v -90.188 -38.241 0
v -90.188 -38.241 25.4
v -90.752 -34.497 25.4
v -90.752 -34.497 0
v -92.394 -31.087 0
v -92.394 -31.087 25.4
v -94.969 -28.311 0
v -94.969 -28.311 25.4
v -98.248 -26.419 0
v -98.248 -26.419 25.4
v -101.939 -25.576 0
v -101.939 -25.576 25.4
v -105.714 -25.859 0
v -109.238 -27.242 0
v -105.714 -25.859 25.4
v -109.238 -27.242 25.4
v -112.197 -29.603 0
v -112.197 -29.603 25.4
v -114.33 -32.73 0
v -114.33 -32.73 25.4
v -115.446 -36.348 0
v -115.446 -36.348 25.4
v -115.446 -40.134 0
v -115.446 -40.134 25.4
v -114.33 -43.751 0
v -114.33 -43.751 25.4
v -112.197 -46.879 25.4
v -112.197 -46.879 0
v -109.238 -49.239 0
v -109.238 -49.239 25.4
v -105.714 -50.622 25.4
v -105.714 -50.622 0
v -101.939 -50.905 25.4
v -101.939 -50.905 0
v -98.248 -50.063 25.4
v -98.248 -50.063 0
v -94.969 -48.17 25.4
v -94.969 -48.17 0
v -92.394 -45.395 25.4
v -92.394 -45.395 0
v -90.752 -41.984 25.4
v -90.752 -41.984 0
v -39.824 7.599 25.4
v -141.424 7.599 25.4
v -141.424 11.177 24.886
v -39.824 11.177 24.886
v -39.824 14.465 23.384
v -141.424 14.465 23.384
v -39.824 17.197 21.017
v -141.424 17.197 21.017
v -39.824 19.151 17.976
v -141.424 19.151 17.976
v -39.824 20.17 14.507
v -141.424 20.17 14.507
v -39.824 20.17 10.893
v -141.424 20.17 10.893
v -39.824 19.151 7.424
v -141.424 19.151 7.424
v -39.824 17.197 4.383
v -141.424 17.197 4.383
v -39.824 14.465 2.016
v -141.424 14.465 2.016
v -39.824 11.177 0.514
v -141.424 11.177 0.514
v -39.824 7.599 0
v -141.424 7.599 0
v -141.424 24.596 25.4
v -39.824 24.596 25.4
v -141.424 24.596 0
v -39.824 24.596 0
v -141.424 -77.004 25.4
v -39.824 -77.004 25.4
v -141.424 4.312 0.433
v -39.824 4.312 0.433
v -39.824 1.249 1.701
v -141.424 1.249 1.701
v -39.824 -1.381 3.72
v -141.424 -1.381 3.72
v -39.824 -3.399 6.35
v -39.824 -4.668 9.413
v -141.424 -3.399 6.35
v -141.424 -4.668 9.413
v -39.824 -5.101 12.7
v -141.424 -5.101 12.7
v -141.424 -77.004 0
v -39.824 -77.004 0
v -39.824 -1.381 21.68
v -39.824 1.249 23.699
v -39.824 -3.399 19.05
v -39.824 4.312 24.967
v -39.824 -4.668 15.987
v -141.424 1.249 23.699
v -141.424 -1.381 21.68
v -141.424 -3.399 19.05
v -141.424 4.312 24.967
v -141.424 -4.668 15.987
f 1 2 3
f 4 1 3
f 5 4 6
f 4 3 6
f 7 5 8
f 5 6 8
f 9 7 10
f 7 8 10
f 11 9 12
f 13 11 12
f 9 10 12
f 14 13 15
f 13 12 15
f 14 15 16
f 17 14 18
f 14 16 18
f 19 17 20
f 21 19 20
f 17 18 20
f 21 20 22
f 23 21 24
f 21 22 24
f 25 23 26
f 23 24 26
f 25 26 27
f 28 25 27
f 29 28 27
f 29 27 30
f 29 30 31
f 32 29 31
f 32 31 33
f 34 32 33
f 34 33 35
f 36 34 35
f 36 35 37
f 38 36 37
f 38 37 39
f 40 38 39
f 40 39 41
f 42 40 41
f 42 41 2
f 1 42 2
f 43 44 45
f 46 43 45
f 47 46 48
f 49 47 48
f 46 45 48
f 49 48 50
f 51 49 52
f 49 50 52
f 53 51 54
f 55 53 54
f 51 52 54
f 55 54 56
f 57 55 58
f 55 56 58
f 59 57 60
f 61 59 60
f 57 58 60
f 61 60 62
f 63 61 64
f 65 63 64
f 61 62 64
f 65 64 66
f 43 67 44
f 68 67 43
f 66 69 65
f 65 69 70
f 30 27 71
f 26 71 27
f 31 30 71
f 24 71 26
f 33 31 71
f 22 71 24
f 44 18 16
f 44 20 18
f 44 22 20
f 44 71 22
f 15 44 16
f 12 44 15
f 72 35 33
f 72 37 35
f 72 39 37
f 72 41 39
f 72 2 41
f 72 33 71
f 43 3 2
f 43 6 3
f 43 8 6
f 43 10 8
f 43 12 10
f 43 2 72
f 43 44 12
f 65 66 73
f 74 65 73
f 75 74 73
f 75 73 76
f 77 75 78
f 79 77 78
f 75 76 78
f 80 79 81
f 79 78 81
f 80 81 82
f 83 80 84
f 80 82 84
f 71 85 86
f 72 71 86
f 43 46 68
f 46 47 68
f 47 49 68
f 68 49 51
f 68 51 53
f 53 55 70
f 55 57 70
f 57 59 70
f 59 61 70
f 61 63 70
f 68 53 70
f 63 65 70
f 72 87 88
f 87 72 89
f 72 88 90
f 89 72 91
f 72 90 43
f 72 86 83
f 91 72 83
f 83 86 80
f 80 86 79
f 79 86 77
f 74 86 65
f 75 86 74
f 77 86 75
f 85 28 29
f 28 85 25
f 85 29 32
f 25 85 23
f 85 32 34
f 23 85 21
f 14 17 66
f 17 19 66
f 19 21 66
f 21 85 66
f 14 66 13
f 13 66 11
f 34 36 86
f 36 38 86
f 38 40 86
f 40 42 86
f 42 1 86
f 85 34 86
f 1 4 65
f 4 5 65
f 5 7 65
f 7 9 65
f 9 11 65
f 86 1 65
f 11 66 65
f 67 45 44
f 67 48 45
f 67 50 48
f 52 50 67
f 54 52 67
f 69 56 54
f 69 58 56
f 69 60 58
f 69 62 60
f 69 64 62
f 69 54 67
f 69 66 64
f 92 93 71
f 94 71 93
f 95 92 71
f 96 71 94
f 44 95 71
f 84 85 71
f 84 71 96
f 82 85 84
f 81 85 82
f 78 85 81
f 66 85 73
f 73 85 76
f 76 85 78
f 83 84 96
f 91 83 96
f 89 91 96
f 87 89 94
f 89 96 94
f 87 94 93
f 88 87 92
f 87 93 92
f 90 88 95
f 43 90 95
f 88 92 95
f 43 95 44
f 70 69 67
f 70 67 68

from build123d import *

# Parameters (mm, degrees)
F0_W     = 101.6
F0_H     = 101.6
F1_DEPTH = 25.4
F3_DEPTH = 101.601
F4_R     = 12.7
F5_DEPTH = 25.401


with BuildPart() as f1:
    # F0 (on Top) → F1 (new body)
    with BuildSketch(Plane.XY):
        with Locations((-90.623922, -26.203949)):
            Rectangle(F0_W, F0_H)
    extrude(amount=F1_DEPTH)

    # F2 (on face) → F3 (cut, through all)
    with BuildSketch(Plane(origin=(-141.423922, 0, 0), x_dir=(0, -1, 0), z_dir=(-1, 0, 0))):
        with BuildLine():
            ThreePointArc((-7.599026, 0), (1.38123, 3.719744), (5.100974, 12.7))
            ThreePointArc((5.100974, 12.7), (1.38123, 21.680256), (-7.599026, 25.4))
            ThreePointArc((-7.599026, 25.4), (-20.299026, 12.7), (-7.599026, 0))
        make_face()
    extrude(amount=-F3_DEPTH, mode=Mode.SUBTRACT)

    # F4 (on face) → F5 (cut, through all)
    with BuildSketch(Plane.XY.offset(25.4)):
        with Locations((-102.88769, -38.240742)):
            Circle(F4_R)
    extrude(amount=-F5_DEPTH, mode=Mode.SUBTRACT)


solid = f1.part
